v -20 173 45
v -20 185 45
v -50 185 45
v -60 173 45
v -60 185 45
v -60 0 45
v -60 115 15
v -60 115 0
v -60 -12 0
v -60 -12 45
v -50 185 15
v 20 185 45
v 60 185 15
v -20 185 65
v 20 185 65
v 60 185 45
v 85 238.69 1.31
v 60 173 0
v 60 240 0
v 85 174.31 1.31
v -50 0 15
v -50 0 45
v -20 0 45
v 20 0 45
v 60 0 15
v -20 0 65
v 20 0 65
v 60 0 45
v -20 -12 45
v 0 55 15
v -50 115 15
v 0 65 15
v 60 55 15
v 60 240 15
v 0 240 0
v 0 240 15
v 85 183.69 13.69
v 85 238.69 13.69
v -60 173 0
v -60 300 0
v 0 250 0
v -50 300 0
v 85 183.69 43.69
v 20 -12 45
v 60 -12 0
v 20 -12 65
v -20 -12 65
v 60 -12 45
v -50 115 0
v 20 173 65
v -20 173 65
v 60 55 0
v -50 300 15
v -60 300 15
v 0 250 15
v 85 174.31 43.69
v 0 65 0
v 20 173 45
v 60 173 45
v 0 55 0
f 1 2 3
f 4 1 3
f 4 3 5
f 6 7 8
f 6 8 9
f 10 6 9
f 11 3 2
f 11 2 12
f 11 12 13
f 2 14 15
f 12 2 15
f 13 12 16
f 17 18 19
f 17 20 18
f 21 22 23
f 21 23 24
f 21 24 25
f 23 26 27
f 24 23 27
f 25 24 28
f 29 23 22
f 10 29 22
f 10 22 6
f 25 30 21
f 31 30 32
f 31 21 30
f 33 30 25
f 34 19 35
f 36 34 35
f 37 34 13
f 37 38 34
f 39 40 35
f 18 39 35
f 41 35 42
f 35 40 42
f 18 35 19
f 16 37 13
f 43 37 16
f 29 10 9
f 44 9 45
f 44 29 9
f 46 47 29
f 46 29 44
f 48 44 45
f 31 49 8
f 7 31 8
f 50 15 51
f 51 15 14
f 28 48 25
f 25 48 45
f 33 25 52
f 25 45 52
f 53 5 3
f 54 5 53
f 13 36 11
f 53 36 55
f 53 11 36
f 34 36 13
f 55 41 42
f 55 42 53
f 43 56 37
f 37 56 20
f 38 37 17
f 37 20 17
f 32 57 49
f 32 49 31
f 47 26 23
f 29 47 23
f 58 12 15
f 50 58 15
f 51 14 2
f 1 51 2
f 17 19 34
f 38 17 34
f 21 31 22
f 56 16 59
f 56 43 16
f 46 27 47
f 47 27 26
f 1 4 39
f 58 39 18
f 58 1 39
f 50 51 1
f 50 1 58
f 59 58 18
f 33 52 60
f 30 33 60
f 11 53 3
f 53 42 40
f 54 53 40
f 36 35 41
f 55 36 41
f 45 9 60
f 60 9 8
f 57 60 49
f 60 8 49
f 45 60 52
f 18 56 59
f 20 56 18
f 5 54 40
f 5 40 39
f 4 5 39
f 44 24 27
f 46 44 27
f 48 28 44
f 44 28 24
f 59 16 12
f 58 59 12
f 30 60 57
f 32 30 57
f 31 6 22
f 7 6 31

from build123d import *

# Parameters (mm, degrees)
F1_DEPTH = 12
F3_DEPTH = 15
F5_DEPTH = 10
F6_SIZE  = 50
F8_DEPTH = 25
F8_TAPER = 3


with BuildPart() as f1:
    # F0 (on Front) → F1 (new body)
    with BuildSketch(Plane.XZ):
        Polygon((-60, 0), (0, 0), (60, 0), (60, 45), (20, 45), (20, 65), (-20, 65), (-20, 45), (-60, 45), align=None)
    extrude(amount=F1_DEPTH)

    # F2 (on Top) → F3 (join)
    with BuildSketch(Plane.XY):
        Polygon((-60, 0), (0, 0), (60, 0), (60, 55), (0, 55), (0, 115), (-60, 115), align=None)
    extrude(amount=F3_DEPTH)

    # F4 (on face) → F5 (join)
    with BuildSketch(Plane(origin=(-60, 0, 0), x_dir=(0, -1, 0), z_dir=(-1, 0, 0))):
        Polygon((0, 45), (-115, 15), (0, 15), align=None)
    extrude(amount=-F5_DEPTH)

    # F6
    f6_edges = [f1.edges().sort_by_distance(p)[0] for p in [
        (0, 115, 7.5),
    ]]
    chamfer(f6_edges, length=F6_SIZE)


with BuildPart() as f7_1:
    # F7: copy of F1
    add(f1.part.moved(Location((0, 185, 0))))

    # F7_face (on face) → F8 (join)
    with BuildSketch(Plane(origin=(60, 199.2472527473, 13.4340659341), x_dir=(0, 1, 0), z_dir=(1, 0, 0))):
        Polygon((-26.2472527473, 31.5659340659), (-26.2472527473, -13.4340659341), (40.7527472527, -13.4340659341), (40.7527472527, 1.5659340659), (-14.2472527473, 1.5659340659), (-14.2472527473, 31.5659340659), align=None)
    extrude(amount=F8_DEPTH, taper=F8_TAPER)


solid = Compound([f1.part, f7_1.part])
